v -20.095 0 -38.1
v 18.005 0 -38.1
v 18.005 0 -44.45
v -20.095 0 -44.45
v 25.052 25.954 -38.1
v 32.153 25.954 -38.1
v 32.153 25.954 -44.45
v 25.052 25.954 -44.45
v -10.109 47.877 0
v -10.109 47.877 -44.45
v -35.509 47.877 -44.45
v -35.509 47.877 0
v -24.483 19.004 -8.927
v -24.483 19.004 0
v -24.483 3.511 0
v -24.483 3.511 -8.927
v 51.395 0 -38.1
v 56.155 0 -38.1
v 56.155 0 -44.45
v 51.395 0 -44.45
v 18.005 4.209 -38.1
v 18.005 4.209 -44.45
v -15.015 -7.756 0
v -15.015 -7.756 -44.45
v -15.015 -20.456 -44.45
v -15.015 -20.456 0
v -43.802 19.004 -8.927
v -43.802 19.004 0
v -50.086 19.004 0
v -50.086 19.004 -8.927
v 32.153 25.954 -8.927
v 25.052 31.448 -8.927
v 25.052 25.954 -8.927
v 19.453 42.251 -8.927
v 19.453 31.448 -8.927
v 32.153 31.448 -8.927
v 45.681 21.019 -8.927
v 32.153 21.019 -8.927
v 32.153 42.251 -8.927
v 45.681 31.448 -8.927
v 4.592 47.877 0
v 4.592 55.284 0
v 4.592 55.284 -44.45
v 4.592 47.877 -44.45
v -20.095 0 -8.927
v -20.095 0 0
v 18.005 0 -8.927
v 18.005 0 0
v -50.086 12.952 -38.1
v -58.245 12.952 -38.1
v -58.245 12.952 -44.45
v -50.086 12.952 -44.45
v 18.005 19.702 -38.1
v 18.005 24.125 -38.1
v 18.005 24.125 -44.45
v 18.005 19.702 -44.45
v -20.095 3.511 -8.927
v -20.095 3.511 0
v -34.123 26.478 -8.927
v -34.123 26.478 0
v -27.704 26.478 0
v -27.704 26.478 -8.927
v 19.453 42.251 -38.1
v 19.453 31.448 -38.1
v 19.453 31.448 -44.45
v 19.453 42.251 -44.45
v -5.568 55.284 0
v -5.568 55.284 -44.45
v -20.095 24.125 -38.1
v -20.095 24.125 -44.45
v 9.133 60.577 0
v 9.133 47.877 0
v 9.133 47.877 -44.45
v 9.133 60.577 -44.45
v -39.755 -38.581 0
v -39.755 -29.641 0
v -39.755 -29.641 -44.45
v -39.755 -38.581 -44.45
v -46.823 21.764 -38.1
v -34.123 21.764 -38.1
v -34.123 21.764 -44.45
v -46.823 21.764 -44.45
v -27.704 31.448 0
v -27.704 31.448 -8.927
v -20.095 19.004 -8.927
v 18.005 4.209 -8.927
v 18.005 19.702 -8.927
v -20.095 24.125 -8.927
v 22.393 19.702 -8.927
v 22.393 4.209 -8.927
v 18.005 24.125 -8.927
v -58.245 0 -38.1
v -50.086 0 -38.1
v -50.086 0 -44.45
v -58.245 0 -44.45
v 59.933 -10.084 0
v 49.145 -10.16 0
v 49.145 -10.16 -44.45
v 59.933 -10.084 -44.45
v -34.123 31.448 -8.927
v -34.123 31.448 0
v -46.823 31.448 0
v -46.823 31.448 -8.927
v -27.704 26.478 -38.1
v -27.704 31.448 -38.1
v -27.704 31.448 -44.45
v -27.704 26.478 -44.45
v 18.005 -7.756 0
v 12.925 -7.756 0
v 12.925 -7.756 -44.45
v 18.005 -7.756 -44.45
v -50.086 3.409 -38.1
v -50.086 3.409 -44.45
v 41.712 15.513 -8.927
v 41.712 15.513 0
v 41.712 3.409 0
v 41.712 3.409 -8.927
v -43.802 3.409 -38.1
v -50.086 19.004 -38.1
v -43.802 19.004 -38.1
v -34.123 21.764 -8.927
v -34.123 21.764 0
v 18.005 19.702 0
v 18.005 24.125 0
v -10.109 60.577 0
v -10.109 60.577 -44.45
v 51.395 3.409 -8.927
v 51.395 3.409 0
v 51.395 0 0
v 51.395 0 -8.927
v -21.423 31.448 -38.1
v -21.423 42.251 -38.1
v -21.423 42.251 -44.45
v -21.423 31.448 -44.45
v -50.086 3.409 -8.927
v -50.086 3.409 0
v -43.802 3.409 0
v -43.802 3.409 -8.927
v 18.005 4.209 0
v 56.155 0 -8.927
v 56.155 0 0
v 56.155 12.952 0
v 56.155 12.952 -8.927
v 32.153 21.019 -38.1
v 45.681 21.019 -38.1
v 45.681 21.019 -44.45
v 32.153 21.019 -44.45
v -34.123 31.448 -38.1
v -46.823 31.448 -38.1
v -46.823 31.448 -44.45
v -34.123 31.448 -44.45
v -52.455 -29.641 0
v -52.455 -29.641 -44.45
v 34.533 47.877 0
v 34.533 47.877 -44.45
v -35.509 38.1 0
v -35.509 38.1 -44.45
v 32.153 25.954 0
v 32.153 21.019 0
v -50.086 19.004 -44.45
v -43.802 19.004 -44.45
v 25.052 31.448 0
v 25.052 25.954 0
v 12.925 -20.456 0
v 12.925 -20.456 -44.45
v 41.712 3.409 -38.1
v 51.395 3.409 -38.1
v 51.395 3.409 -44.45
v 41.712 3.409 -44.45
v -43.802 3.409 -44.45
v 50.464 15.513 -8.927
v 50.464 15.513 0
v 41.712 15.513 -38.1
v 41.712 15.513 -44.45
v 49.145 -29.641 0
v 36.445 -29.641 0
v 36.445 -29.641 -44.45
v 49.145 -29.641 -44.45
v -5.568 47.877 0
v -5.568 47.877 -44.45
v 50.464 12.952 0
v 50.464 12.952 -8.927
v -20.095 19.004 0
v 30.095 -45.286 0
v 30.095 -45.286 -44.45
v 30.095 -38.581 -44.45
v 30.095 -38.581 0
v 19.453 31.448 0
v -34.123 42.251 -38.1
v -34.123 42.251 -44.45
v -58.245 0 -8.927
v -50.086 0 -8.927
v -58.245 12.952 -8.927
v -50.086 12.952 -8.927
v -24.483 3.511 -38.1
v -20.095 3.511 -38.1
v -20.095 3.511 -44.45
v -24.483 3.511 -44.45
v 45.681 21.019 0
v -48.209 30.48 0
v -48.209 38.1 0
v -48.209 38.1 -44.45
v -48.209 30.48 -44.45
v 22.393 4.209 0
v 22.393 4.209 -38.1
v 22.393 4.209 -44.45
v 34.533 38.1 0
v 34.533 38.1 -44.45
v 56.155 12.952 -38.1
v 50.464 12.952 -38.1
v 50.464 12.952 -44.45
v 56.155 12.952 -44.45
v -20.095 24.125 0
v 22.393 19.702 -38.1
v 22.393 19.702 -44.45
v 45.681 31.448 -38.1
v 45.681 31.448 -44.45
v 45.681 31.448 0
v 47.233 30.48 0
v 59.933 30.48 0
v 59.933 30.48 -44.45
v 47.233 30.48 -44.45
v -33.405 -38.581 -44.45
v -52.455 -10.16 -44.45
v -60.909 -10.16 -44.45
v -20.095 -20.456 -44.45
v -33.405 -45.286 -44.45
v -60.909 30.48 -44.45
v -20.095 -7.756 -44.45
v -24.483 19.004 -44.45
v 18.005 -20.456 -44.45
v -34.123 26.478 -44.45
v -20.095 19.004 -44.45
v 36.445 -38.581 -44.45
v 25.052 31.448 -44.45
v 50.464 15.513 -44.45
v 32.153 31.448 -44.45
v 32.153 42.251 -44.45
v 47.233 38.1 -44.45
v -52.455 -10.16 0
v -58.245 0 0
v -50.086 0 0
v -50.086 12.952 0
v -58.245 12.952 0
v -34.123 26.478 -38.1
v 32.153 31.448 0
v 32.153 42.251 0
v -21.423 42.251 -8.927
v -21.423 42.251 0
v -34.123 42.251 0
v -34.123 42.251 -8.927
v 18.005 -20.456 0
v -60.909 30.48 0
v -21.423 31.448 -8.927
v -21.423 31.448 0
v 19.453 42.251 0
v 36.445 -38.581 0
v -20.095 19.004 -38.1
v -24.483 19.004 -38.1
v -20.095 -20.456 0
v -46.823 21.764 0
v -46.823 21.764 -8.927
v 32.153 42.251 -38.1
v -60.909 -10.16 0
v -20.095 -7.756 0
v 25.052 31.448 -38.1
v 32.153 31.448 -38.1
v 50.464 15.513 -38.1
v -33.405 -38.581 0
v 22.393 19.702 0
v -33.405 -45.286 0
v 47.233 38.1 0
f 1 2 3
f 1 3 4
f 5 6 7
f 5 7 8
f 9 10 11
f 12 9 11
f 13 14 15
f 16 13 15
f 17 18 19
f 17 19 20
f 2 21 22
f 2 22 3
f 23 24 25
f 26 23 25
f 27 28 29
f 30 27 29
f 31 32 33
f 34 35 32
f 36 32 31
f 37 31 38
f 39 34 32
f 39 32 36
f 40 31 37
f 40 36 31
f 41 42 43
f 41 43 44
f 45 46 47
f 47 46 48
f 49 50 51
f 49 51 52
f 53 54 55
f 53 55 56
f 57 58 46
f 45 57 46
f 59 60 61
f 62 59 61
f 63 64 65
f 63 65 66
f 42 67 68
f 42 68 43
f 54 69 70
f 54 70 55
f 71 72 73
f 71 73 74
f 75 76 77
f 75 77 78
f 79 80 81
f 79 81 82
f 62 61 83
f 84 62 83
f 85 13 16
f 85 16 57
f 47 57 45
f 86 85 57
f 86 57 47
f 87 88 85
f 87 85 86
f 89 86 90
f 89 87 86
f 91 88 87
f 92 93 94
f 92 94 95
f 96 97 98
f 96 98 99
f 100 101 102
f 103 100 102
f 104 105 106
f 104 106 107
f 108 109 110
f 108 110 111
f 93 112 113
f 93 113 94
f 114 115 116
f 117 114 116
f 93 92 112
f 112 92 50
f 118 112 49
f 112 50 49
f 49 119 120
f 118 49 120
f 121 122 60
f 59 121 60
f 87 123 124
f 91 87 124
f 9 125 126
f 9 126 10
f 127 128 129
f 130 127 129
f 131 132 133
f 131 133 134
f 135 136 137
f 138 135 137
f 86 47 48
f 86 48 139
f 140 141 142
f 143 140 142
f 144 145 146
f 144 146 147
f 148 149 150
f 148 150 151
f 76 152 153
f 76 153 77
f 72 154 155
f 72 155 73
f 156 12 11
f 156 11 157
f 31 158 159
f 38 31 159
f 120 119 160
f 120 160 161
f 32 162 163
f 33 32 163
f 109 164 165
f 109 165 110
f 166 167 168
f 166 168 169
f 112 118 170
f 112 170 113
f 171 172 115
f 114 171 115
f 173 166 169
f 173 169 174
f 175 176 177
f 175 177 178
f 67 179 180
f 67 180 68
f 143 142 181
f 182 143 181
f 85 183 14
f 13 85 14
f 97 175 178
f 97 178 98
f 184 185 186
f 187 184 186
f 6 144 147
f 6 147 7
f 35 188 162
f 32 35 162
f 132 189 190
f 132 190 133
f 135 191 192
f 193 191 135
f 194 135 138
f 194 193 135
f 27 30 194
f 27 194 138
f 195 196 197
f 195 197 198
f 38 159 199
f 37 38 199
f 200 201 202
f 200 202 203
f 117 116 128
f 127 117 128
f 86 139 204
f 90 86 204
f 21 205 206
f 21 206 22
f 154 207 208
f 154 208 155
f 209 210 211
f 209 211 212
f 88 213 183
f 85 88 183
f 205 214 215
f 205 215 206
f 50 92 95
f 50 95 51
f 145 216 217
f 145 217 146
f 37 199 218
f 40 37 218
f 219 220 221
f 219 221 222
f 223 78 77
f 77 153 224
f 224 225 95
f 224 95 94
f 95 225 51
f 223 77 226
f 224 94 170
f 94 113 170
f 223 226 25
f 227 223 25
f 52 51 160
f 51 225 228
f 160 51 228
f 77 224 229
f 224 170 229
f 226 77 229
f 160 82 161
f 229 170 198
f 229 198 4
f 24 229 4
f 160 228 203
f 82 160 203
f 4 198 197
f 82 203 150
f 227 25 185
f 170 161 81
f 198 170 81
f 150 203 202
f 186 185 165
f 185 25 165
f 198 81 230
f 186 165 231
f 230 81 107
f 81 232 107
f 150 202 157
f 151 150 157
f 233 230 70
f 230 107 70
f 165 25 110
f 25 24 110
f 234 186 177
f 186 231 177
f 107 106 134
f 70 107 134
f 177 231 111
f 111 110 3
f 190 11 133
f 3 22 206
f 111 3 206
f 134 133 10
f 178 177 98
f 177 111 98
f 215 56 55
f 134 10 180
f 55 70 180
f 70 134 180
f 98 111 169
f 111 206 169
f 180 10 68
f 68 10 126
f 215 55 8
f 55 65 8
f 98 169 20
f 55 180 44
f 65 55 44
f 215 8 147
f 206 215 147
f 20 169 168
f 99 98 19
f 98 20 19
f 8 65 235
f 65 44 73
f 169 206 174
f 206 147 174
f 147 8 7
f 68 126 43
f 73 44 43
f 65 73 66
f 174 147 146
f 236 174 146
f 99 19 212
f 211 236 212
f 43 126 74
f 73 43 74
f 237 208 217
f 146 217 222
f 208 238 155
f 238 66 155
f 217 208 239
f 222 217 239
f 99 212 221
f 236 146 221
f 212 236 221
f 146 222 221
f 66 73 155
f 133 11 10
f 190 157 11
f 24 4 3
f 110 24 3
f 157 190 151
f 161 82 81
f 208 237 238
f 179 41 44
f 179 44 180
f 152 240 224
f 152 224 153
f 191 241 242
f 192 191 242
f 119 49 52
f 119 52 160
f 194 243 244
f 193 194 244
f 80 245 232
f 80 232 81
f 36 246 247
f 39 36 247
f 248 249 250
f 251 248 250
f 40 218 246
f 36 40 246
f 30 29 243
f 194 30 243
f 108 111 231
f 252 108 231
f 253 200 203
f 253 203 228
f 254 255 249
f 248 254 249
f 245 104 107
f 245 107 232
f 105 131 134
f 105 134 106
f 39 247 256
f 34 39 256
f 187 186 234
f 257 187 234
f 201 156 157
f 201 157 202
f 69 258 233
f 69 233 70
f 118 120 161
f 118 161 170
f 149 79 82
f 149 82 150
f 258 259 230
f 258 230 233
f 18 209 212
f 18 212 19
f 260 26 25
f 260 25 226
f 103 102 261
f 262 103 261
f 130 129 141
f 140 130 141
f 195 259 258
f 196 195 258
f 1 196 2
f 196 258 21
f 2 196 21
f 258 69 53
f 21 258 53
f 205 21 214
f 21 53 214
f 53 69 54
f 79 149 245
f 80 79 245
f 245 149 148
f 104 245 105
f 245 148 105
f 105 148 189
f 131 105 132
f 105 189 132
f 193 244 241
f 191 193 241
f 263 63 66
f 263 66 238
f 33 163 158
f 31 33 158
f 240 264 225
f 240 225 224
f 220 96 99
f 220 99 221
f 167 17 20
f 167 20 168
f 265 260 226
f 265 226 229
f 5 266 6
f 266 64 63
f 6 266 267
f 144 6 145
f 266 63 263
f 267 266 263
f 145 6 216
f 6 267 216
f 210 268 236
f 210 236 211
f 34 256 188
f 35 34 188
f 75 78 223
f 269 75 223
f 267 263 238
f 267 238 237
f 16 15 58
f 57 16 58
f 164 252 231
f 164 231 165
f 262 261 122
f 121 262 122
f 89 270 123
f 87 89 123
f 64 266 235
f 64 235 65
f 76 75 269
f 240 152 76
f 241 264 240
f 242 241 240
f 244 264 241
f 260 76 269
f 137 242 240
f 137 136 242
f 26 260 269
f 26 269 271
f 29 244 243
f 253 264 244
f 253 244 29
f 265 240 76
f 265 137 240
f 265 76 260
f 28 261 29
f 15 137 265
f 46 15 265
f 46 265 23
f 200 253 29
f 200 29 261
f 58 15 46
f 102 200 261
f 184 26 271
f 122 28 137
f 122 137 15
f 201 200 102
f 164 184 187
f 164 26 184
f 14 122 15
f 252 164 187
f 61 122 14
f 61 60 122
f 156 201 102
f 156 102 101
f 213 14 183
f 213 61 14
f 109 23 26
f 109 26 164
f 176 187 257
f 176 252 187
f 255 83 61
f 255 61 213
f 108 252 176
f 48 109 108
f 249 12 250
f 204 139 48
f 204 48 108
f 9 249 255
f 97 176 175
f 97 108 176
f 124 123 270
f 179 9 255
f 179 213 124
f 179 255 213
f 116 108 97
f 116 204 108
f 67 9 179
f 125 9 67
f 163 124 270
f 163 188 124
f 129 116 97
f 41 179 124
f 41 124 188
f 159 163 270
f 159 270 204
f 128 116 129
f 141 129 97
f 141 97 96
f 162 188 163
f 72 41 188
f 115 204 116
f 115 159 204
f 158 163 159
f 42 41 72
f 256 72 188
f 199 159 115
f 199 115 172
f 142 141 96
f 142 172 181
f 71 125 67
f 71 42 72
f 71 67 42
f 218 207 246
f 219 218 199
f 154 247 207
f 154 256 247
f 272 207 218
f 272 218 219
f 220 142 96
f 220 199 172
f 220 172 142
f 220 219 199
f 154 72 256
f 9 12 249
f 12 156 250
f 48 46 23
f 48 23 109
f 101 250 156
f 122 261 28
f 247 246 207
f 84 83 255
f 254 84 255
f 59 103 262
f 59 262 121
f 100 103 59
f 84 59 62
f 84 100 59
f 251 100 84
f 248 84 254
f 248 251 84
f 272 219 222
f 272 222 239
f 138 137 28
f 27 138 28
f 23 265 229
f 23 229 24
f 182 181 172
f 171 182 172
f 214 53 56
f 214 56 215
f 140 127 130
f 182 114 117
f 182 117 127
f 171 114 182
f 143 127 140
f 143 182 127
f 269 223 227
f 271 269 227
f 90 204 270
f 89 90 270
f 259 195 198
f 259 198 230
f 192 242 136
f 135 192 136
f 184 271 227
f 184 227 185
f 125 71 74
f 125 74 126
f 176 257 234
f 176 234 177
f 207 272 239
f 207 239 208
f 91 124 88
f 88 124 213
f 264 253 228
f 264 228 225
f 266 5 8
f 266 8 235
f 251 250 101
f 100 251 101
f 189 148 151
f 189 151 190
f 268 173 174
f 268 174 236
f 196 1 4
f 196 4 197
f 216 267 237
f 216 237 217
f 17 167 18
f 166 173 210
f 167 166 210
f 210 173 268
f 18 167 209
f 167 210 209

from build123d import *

# Parameters (mm, degrees)
F1_DEPTH = 44.45
F2_DEPTH = 38.1
F3_DEPTH = 8.92661


with BuildPart() as f1:
    # F0 (on Top) → F1 (new body)
    with BuildSketch(Plane.XY):
        Polygon((59.9326238802, -10.0844367775), (59.9326238802, 30.48), (47.2326238802, 30.48), (47.2326238802, 38.1), (34.5326238802, 38.1), (34.5326238802, 47.8773999231), (9.1326238802, 47.8773999231), (4.5917662157, 47.8773999231), (-5.5682337843, 47.8773999231), (-10.1090914488, 47.8773999231), (-35.5090914488, 47.8773999231), (-35.5090914488, 38.1), (-48.2090914488, 38.1), (-48.2090914488, 30.48), (-60.9090914488, 30.48), (-60.9090914488, -10.16), (-52.4551342213, -10.16), (-37.2151342213, -10.16), (-37.2151342213, -4.8143821768), (33.9048657787, -4.8143821768), (33.9048657787, -10.16), (49.1448657787, -10.16), align=None)
        Polygon((-58.2453422248, 12.9522867501), (-58.2453422248, 21.7635072768), (-46.8229997575, 21.7635072768), (-46.8229997575, 31.4483940601), (-34.1229997575, 31.4483940601), (-34.1229997575, 42.2507673502), (-21.4229997575, 42.2507673502), (19.4527748972, 42.2507673502), (32.1527748972, 42.2507673502), (32.1527748972, 31.4483940601), (45.6809252501, 31.4483940601), (45.6809252501, 21.018518135), (56.1551556194, 21.018518135), (56.1551556194, 12.9522867501), (56.1551556194, 0), (56.1551556194, -7.2993603218), (38.3249066973, -7.2993603218), (38.3249066973, -0.0041214007), (-40.4150933027, -0.0041214007), (-40.4150933027, -8.0205244012), (-58.2453422248, -8.0205244012), (-58.2453422248, 0), align=None, mode=Mode.SUBTRACT)
        Polygon((49.1448657787, -29.6408813447), (49.1448657787, -10.16), (33.9048657787, -10.16), (33.9048657787, -4.8143821768), (-37.2151342213, -4.8143821768), (-37.2151342213, -10.16), (-52.4551342213, -10.16), (-52.4551342213, -29.6408813447), (-39.7551342213, -29.6408813447), (-39.7551342213, -38.5807752609), (-33.4051342213, -38.5807752609), (-33.4051342213, -45.2856980264), (30.0948657787, -45.2856980264), (30.0948657787, -38.5807752609), (36.4448657787, -38.5807752609), (36.4448657787, -29.6408813447), align=None)
        Polygon((31.5474388957, -16.645764932), (44.2474388957, -16.645764932), (44.2474388957, -26.2884218246), (31.5474388957, -26.2884218246), (31.5474388957, -32.2483479977), (25.1974388957, -32.2483479977), (25.1974388957, -41.1882456392), (-28.3929689348, -41.1882456392), (-28.3929689348, -34.483326599), (-34.7429689348, -34.483326599), (-34.7429689348, -26.2884218246), (-47.4429689348, -26.2884218246), (-47.4429689348, -16.645764932), (-34.7429689348, -16.645764932), (-34.7429689348, -7.755764932), (-20.0950933027, -7.755764932), (-15.0150933027, -7.755764932), (12.9249066973, -7.755764932), (18.0049066973, -7.755764932), (31.5474388957, -7.755764932), align=None, mode=Mode.SUBTRACT)
        Polygon((-46.8229997575, 21.7635072768), (-58.2453422248, 21.7635072768), (-58.2453422248, 12.9522867501), (-50.0864312053, 12.9522867501), (-50.0864312053, 19.0039230511), (-43.8020415604, 19.0039230511), (-43.8020415604, 3.4093181603), (-50.0864312053, 3.4093181603), (-50.0864312053, 0), (-58.2453422248, 0), (-58.2453422248, -8.0205244012), (-40.4150933027, -8.0205244012), (-40.4150933027, -0.0041214007), (38.3249066973, -0.0041214007), (38.3249066973, -7.2993603218), (56.1551556194, -7.2993603218), (56.1551556194, 0), (51.3948649168, 0), (51.3948649168, 3.4093209542), (41.711854955, 3.4093209542), (41.711854955, 15.5125940219), (50.4638440907, 15.5125940219), (50.4638440907, 12.9522867501), (56.1551556194, 12.9522867501), (56.1551556194, 21.018518135), (45.6809252501, 21.018518135), (32.1527748972, 21.018518135), (32.1527748972, 25.9544569999), (25.0515304506, 25.9544569999), (25.0515304506, 31.4483940601), (19.4527748972, 31.4483940601), (19.4527748972, 42.2507673502), (-21.4229997575, 42.2507673502), (-21.4229997575, 31.4483940601), (-27.7042705566, 31.4483940601), (-27.7042705566, 26.4783278108), (-34.1229997575, 26.4783278108), (-34.1229997575, 21.7635072768), align=None)
        Polygon((18.0049066973, 0), (-20.0950933027, 0), (-20.0950933027, 3.511225339), (-24.4833528996, 3.511225339), (-24.4833528996, 19.0039230511), (-20.0950933027, 19.0039230511), (-20.0950933027, 24.1245422512), (18.0049066973, 24.1245422512), (18.0049066973, 19.702189602), (22.3931662941, 19.702189602), (22.3931662941, 4.2094918899), (18.0049066973, 4.2094918899), align=None, mode=Mode.SUBTRACT)
        Polygon((44.2474388957, -26.2884218246), (44.2474388957, -16.645764932), (31.5474388957, -16.645764932), (31.5474388957, -7.755764932), (18.0049066973, -7.755764932), (18.0049066973, -20.455764932), (12.9249066973, -20.455764932), (12.9249066973, -7.755764932), (-15.0150933027, -7.755764932), (-15.0150933027, -20.455764932), (-20.0950933027, -20.455764932), (-20.0950933027, -7.755764932), (-34.7429689348, -7.755764932), (-34.7429689348, -16.645764932), (-47.4429689348, -16.645764932), (-47.4429689348, -26.2884218246), (-34.7429689348, -26.2884218246), (-34.7429689348, -34.483326599), (-28.3929689348, -34.483326599), (-28.3929689348, -41.1882456392), (25.1974388957, -41.1882456392), (25.1974388957, -32.2483479977), (31.5474388957, -32.2483479977), (31.5474388957, -26.2884218246), align=None)
        Polygon((4.5917662157, 47.8773999231), (9.1326238802, 47.8773999231), (9.1326238802, 60.5773999231), (-10.1090914488, 60.5773999231), (-10.1090914488, 47.8773999231), (-5.5682337843, 47.8773999231), (-5.5682337843, 55.2843213081), (4.5917662157, 55.2843213081), align=None)
    extrude(amount=-F1_DEPTH)

    # F0 (on Top) → F2 (join)
    with BuildSketch(Plane.XY):
        Polygon((32.1527748972, 42.2507673502), (19.4527748972, 42.2507673502), (19.4527748972, 31.4483940601), (25.0515304506, 31.4483940601), (25.0515304506, 25.9544569999), (32.1527748972, 25.9544569999), (32.1527748972, 21.018518135), (45.6809252501, 21.018518135), (45.6809252501, 31.4483940601), (32.1527748972, 31.4483940601), align=None)
        Polygon((51.3948649168, 0), (56.1551556194, 0), (56.1551556194, 12.9522867501), (50.4638440907, 12.9522867501), (50.4638440907, 15.5125940219), (41.711854955, 15.5125940219), (41.711854955, 3.4093209542), (51.3948649168, 3.4093209542), align=None)
        Polygon((-20.0950933027, 3.511225339), (-20.0950933027, 0), (18.0049066973, 0), (18.0049066973, 4.2094918899), (22.3931662941, 4.2094918899), (22.3931662941, 19.702189602), (18.0049066973, 19.702189602), (18.0049066973, 24.1245422512), (-20.0950933027, 24.1245422512), (-20.0950933027, 19.0039230511), (-24.4833528996, 19.0039230511), (-24.4833528996, 3.511225339), align=None)
        Polygon((-46.8229997575, 31.4483940601), (-46.8229997575, 21.7635072768), (-34.1229997575, 21.7635072768), (-34.1229997575, 26.4783278108), (-27.7042705566, 26.4783278108), (-27.7042705566, 31.4483940601), (-21.4229997575, 31.4483940601), (-21.4229997575, 42.2507673502), (-34.1229997575, 42.2507673502), (-34.1229997575, 31.4483940601), align=None)
        Polygon((-50.0864312053, 12.9522867501), (-58.2453422248, 12.9522867501), (-58.2453422248, 0), (-50.0864312053, 0), (-50.0864312053, 3.4093181603), (-43.8020415604, 3.4093181603), (-43.8020415604, 19.0039230511), (-50.0864312053, 19.0039230511), align=None)
    extrude(amount=-F2_DEPTH)

    # F0 (on Top) → F3 (cut)
    with BuildSketch(Plane.XY):
        Polygon((-50.0864312053, 12.9522867501), (-58.2453422248, 12.9522867501), (-58.2453422248, 0), (-50.0864312053, 0), (-50.0864312053, 3.4093181603), (-43.8020415604, 3.4093181603), (-43.8020415604, 19.0039230511), (-50.0864312053, 19.0039230511), align=None)
        Polygon((-46.8229997575, 31.4483940601), (-46.8229997575, 21.7635072768), (-34.1229997575, 21.7635072768), (-34.1229997575, 26.4783278108), (-27.7042705566, 26.4783278108), (-27.7042705566, 31.4483940601), (-21.4229997575, 31.4483940601), (-21.4229997575, 42.2507673502), (-34.1229997575, 42.2507673502), (-34.1229997575, 31.4483940601), align=None)
        Polygon((-20.0950933027, 3.511225339), (-20.0950933027, 0), (18.0049066973, 0), (18.0049066973, 4.2094918899), (22.3931662941, 4.2094918899), (22.3931662941, 19.702189602), (18.0049066973, 19.702189602), (18.0049066973, 24.1245422512), (-20.0950933027, 24.1245422512), (-20.0950933027, 19.0039230511), (-24.4833528996, 19.0039230511), (-24.4833528996, 3.511225339), align=None)
        Polygon((32.1527748972, 42.2507673502), (19.4527748972, 42.2507673502), (19.4527748972, 31.4483940601), (25.0515304506, 31.4483940601), (25.0515304506, 25.9544569999), (32.1527748972, 25.9544569999), (32.1527748972, 21.018518135), (45.6809252501, 21.018518135), (45.6809252501, 31.4483940601), (32.1527748972, 31.4483940601), align=None)
        Polygon((51.3948649168, 0), (56.1551556194, 0), (56.1551556194, 12.9522867501), (50.4638440907, 12.9522867501), (50.4638440907, 15.5125940219), (41.711854955, 15.5125940219), (41.711854955, 3.4093209542), (51.3948649168, 3.4093209542), align=None)
    extrude(amount=-F3_DEPTH, mode=Mode.SUBTRACT)


solid = f1.part
